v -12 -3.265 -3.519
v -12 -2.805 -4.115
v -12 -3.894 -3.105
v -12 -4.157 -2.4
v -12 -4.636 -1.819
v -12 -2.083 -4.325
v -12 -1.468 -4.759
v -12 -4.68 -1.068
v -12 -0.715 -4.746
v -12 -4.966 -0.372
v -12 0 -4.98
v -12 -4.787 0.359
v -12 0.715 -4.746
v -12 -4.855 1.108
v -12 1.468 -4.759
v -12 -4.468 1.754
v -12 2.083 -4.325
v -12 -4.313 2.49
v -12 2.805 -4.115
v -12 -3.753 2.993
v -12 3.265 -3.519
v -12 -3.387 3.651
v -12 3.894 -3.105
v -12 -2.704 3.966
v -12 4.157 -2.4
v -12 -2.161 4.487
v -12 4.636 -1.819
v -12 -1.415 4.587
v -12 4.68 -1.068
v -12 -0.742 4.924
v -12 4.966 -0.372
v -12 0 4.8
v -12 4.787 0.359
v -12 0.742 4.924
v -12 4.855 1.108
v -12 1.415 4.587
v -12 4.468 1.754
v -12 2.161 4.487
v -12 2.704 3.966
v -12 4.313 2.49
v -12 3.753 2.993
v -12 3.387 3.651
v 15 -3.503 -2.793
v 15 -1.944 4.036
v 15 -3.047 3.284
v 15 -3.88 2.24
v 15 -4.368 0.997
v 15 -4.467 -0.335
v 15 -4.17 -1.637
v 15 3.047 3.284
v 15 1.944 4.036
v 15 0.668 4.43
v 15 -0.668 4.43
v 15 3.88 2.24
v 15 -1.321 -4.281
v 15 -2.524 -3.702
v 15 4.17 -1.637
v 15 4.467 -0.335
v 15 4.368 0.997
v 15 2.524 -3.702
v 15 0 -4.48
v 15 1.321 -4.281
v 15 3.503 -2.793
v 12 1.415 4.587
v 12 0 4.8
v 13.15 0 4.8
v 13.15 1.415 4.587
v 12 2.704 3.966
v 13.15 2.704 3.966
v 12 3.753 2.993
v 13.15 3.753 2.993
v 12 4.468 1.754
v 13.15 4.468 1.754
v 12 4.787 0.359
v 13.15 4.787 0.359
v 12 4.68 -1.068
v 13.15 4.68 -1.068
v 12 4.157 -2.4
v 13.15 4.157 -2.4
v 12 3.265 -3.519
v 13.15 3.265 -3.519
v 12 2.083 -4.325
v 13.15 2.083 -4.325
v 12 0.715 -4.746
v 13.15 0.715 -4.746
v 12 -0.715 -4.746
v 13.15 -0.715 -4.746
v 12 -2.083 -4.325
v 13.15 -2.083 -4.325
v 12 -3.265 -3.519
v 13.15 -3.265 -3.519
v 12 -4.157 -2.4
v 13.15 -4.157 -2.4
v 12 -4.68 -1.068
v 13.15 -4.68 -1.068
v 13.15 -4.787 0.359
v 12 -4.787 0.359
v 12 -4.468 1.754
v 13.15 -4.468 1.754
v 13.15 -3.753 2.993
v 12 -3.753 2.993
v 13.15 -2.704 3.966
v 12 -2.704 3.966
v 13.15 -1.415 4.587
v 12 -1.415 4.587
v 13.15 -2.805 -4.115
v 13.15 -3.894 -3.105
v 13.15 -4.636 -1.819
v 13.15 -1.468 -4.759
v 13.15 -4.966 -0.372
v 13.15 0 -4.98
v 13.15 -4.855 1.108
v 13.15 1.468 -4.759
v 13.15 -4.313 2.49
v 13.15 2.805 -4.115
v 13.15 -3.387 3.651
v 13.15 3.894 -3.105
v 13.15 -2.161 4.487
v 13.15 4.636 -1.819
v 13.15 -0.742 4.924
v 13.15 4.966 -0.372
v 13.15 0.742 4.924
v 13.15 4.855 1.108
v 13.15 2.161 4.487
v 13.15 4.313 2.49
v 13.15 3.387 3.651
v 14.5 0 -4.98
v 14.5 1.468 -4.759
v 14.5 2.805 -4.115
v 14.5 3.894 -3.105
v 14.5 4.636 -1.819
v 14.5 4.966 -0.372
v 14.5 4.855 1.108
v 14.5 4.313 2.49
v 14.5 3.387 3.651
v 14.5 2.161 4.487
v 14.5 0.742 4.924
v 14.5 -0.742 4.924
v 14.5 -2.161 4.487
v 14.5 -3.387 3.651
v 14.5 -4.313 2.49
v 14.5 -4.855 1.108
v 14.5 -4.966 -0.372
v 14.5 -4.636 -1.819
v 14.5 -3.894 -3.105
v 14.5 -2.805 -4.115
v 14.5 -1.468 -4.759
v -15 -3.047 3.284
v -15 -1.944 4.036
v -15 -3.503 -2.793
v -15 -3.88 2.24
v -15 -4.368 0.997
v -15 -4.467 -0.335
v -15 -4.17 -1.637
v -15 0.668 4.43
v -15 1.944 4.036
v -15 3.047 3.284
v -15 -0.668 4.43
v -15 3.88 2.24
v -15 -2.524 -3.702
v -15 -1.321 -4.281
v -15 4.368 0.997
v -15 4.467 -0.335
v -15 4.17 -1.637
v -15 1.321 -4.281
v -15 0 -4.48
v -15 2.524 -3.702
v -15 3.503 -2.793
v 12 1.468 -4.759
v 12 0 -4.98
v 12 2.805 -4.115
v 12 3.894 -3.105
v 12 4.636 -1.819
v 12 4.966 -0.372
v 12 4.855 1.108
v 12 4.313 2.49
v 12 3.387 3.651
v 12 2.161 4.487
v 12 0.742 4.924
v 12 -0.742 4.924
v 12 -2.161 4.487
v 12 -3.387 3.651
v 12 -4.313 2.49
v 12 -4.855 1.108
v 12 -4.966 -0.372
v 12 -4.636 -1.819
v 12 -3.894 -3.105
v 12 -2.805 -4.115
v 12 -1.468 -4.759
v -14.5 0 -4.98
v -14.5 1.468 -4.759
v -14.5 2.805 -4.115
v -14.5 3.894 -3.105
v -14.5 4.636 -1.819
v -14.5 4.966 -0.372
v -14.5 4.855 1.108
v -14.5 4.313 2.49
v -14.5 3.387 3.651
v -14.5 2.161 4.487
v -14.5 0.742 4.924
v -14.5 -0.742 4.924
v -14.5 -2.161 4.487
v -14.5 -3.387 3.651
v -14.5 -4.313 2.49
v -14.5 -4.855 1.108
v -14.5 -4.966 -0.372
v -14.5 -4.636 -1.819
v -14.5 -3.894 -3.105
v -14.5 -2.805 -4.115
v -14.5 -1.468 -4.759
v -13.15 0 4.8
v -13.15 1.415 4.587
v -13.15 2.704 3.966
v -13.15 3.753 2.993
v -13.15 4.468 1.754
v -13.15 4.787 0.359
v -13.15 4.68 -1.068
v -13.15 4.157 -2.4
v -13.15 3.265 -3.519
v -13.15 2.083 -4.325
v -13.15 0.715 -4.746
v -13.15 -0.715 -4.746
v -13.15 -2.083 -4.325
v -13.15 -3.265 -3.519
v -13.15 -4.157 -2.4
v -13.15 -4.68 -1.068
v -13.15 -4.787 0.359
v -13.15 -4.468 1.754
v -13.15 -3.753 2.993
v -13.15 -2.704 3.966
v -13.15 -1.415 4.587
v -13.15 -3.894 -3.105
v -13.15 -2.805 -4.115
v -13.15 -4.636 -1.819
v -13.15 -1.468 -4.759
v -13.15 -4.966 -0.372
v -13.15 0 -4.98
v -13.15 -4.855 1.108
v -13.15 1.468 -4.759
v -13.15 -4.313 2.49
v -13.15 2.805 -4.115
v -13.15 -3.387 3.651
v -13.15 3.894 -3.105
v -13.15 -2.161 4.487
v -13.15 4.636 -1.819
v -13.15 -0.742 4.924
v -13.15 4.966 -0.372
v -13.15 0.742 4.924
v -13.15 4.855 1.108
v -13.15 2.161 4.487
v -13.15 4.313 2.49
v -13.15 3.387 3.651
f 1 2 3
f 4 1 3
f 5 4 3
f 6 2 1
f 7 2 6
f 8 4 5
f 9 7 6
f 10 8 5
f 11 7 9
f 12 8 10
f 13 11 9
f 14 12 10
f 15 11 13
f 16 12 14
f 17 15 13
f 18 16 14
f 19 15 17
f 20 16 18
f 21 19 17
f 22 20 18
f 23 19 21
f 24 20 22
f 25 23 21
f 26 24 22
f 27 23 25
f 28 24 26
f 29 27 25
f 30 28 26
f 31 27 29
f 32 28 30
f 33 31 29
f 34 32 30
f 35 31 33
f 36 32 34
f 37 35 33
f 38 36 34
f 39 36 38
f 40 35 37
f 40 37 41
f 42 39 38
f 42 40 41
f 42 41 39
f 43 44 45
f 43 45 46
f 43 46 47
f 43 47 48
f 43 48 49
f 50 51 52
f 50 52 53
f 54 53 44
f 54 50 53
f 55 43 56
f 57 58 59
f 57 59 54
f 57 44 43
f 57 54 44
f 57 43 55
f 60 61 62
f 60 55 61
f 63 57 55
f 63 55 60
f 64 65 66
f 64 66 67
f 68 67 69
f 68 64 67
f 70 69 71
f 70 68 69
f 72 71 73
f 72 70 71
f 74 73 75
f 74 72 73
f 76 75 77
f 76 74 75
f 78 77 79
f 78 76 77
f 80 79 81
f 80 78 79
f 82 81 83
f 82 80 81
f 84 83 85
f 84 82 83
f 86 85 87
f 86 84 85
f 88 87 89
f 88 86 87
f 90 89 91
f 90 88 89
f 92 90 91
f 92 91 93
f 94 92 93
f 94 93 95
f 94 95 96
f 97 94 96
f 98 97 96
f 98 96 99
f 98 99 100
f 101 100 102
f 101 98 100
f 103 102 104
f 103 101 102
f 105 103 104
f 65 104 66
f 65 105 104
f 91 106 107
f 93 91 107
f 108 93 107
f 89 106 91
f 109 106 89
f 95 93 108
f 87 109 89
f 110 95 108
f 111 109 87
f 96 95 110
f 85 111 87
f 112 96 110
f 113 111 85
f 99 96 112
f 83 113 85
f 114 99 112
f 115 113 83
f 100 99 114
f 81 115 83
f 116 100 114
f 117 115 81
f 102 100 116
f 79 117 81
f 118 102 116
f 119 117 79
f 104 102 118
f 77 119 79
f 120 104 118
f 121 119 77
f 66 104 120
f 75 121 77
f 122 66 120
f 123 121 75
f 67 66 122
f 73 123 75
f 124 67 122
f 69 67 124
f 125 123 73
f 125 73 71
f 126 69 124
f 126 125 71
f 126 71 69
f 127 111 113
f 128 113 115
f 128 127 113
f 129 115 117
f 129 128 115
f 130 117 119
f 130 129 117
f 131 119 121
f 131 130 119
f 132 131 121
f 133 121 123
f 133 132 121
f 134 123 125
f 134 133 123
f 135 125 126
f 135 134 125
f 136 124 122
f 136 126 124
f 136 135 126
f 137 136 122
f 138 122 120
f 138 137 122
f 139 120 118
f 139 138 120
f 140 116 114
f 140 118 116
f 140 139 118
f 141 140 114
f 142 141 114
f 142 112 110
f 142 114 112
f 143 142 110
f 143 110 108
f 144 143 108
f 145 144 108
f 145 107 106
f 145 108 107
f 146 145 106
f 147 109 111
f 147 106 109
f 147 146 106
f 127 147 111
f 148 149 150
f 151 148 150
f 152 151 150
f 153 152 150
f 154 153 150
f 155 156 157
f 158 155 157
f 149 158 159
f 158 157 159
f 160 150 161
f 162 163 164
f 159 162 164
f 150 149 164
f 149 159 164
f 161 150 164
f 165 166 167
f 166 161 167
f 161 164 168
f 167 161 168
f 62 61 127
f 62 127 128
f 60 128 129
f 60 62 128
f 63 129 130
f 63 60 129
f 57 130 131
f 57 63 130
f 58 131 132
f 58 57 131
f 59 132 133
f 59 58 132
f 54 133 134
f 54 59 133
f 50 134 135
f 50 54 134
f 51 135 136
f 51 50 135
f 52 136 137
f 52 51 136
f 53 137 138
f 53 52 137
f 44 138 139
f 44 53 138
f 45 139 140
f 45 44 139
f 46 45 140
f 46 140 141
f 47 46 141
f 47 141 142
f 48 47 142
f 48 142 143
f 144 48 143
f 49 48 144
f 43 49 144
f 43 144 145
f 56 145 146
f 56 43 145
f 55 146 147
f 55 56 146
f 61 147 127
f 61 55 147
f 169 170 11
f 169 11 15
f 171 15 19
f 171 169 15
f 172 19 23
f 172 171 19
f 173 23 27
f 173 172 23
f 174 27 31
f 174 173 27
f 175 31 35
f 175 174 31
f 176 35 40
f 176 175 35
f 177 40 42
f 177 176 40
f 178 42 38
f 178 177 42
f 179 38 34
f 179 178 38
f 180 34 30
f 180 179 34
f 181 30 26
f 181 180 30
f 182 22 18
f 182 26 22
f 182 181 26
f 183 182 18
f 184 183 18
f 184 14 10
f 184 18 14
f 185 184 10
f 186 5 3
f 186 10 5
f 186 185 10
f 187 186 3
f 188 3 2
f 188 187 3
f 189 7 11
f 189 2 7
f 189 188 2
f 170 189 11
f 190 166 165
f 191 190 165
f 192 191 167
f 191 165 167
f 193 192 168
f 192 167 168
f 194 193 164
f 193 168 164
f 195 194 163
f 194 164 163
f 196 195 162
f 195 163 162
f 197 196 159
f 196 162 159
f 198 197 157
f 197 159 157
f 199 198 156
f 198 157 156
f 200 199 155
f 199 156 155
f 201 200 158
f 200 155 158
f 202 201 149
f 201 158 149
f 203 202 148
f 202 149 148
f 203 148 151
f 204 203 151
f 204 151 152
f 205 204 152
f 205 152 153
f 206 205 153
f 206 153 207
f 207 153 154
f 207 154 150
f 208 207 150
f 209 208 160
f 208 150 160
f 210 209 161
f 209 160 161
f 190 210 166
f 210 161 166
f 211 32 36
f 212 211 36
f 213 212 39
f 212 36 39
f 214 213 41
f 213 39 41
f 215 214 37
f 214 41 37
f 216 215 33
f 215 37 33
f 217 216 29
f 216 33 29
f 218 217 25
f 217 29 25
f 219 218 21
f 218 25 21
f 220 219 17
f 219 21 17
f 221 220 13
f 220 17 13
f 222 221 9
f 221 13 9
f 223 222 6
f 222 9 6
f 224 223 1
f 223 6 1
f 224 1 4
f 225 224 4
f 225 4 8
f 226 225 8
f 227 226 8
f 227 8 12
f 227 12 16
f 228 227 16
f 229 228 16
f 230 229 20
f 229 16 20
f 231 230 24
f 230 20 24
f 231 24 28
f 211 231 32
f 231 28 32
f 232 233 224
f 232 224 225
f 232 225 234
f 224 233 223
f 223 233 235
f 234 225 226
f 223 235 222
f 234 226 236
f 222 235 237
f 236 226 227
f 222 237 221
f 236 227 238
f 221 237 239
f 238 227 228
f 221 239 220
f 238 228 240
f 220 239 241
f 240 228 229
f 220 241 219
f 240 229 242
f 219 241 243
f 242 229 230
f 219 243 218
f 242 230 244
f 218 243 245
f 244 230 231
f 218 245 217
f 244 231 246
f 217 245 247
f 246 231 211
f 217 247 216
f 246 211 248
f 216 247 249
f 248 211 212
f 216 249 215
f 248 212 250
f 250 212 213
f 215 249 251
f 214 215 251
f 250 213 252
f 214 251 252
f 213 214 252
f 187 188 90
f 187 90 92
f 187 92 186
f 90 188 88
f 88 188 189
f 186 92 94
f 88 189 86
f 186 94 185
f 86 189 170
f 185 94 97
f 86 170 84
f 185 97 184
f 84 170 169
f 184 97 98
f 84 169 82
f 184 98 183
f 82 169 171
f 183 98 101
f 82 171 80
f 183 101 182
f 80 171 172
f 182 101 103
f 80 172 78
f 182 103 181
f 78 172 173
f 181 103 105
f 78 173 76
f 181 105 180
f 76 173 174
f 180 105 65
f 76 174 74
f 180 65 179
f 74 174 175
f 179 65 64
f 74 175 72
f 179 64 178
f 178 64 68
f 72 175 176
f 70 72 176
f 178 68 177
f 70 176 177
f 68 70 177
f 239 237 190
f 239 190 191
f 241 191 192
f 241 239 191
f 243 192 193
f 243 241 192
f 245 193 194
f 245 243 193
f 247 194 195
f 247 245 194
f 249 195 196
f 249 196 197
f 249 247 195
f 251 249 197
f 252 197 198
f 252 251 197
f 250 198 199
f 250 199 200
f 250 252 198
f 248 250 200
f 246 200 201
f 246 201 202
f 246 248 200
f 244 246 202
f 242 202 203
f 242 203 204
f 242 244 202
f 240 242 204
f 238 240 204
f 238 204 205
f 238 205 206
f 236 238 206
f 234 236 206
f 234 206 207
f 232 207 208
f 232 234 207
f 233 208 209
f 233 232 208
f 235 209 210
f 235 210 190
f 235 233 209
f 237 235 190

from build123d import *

# Parameters (mm, degrees)
SKETCH1_R           = 4.98
BOSS_EXTRUDE1_DEPTH = 15
CUT_EXTRUDE1_START  = -3
SKETCH2_R           = 4.98
SKETCH2_R_2         = 4.8
CUT_EXTRUDE1_DEPTH  = 1.15
CHAMFER1_SIZE       = 0.5
CHAMFER2_SIZE       = 0.5


with BuildPart() as part:
    # Sketch1 → Boss-Extrude1 (new, symmetric)
    with BuildSketch(Plane(origin=(0, 0, 0), x_dir=(0, 0, -1), z_dir=(1, 0, 0))):
        Circle(SKETCH1_R)
    extrude(amount=BOSS_EXTRUDE1_DEPTH, both=True)

    # Sketch2 → Cut-Extrude1 (cut)
    with BuildSketch(Plane.ZY.offset(15).offset(CUT_EXTRUDE1_START)):
        Circle(SKETCH2_R)
        Circle(SKETCH2_R_2, mode=Mode.SUBTRACT)
    cut_extrude1 = extrude(amount=CUT_EXTRUDE1_DEPTH, mode=Mode.SUBTRACT)

    # Chamfer1
    chamfer1_edges = [part.edges().sort_by_distance(p)[0] for p in [
        (-15, 0, 4.98),
    ]]
    chamfer(chamfer1_edges, length=CHAMFER1_SIZE)

    # Mirror1: Cut-Extrude1 across plane
    add(cut_extrude1.mirror(Plane(origin=(0, 0, 0), x_dir=(0, 0, 1), z_dir=(1, 0, 0))), mode=Mode.SUBTRACT)

    # Chamfer2
    chamfer2_edges = [part.edges().sort_by_distance(p)[0] for p in [
        (15, 0, 4.98),
    ]]
    chamfer(chamfer2_edges, length=CHAMFER2_SIZE)


solid = part.part
